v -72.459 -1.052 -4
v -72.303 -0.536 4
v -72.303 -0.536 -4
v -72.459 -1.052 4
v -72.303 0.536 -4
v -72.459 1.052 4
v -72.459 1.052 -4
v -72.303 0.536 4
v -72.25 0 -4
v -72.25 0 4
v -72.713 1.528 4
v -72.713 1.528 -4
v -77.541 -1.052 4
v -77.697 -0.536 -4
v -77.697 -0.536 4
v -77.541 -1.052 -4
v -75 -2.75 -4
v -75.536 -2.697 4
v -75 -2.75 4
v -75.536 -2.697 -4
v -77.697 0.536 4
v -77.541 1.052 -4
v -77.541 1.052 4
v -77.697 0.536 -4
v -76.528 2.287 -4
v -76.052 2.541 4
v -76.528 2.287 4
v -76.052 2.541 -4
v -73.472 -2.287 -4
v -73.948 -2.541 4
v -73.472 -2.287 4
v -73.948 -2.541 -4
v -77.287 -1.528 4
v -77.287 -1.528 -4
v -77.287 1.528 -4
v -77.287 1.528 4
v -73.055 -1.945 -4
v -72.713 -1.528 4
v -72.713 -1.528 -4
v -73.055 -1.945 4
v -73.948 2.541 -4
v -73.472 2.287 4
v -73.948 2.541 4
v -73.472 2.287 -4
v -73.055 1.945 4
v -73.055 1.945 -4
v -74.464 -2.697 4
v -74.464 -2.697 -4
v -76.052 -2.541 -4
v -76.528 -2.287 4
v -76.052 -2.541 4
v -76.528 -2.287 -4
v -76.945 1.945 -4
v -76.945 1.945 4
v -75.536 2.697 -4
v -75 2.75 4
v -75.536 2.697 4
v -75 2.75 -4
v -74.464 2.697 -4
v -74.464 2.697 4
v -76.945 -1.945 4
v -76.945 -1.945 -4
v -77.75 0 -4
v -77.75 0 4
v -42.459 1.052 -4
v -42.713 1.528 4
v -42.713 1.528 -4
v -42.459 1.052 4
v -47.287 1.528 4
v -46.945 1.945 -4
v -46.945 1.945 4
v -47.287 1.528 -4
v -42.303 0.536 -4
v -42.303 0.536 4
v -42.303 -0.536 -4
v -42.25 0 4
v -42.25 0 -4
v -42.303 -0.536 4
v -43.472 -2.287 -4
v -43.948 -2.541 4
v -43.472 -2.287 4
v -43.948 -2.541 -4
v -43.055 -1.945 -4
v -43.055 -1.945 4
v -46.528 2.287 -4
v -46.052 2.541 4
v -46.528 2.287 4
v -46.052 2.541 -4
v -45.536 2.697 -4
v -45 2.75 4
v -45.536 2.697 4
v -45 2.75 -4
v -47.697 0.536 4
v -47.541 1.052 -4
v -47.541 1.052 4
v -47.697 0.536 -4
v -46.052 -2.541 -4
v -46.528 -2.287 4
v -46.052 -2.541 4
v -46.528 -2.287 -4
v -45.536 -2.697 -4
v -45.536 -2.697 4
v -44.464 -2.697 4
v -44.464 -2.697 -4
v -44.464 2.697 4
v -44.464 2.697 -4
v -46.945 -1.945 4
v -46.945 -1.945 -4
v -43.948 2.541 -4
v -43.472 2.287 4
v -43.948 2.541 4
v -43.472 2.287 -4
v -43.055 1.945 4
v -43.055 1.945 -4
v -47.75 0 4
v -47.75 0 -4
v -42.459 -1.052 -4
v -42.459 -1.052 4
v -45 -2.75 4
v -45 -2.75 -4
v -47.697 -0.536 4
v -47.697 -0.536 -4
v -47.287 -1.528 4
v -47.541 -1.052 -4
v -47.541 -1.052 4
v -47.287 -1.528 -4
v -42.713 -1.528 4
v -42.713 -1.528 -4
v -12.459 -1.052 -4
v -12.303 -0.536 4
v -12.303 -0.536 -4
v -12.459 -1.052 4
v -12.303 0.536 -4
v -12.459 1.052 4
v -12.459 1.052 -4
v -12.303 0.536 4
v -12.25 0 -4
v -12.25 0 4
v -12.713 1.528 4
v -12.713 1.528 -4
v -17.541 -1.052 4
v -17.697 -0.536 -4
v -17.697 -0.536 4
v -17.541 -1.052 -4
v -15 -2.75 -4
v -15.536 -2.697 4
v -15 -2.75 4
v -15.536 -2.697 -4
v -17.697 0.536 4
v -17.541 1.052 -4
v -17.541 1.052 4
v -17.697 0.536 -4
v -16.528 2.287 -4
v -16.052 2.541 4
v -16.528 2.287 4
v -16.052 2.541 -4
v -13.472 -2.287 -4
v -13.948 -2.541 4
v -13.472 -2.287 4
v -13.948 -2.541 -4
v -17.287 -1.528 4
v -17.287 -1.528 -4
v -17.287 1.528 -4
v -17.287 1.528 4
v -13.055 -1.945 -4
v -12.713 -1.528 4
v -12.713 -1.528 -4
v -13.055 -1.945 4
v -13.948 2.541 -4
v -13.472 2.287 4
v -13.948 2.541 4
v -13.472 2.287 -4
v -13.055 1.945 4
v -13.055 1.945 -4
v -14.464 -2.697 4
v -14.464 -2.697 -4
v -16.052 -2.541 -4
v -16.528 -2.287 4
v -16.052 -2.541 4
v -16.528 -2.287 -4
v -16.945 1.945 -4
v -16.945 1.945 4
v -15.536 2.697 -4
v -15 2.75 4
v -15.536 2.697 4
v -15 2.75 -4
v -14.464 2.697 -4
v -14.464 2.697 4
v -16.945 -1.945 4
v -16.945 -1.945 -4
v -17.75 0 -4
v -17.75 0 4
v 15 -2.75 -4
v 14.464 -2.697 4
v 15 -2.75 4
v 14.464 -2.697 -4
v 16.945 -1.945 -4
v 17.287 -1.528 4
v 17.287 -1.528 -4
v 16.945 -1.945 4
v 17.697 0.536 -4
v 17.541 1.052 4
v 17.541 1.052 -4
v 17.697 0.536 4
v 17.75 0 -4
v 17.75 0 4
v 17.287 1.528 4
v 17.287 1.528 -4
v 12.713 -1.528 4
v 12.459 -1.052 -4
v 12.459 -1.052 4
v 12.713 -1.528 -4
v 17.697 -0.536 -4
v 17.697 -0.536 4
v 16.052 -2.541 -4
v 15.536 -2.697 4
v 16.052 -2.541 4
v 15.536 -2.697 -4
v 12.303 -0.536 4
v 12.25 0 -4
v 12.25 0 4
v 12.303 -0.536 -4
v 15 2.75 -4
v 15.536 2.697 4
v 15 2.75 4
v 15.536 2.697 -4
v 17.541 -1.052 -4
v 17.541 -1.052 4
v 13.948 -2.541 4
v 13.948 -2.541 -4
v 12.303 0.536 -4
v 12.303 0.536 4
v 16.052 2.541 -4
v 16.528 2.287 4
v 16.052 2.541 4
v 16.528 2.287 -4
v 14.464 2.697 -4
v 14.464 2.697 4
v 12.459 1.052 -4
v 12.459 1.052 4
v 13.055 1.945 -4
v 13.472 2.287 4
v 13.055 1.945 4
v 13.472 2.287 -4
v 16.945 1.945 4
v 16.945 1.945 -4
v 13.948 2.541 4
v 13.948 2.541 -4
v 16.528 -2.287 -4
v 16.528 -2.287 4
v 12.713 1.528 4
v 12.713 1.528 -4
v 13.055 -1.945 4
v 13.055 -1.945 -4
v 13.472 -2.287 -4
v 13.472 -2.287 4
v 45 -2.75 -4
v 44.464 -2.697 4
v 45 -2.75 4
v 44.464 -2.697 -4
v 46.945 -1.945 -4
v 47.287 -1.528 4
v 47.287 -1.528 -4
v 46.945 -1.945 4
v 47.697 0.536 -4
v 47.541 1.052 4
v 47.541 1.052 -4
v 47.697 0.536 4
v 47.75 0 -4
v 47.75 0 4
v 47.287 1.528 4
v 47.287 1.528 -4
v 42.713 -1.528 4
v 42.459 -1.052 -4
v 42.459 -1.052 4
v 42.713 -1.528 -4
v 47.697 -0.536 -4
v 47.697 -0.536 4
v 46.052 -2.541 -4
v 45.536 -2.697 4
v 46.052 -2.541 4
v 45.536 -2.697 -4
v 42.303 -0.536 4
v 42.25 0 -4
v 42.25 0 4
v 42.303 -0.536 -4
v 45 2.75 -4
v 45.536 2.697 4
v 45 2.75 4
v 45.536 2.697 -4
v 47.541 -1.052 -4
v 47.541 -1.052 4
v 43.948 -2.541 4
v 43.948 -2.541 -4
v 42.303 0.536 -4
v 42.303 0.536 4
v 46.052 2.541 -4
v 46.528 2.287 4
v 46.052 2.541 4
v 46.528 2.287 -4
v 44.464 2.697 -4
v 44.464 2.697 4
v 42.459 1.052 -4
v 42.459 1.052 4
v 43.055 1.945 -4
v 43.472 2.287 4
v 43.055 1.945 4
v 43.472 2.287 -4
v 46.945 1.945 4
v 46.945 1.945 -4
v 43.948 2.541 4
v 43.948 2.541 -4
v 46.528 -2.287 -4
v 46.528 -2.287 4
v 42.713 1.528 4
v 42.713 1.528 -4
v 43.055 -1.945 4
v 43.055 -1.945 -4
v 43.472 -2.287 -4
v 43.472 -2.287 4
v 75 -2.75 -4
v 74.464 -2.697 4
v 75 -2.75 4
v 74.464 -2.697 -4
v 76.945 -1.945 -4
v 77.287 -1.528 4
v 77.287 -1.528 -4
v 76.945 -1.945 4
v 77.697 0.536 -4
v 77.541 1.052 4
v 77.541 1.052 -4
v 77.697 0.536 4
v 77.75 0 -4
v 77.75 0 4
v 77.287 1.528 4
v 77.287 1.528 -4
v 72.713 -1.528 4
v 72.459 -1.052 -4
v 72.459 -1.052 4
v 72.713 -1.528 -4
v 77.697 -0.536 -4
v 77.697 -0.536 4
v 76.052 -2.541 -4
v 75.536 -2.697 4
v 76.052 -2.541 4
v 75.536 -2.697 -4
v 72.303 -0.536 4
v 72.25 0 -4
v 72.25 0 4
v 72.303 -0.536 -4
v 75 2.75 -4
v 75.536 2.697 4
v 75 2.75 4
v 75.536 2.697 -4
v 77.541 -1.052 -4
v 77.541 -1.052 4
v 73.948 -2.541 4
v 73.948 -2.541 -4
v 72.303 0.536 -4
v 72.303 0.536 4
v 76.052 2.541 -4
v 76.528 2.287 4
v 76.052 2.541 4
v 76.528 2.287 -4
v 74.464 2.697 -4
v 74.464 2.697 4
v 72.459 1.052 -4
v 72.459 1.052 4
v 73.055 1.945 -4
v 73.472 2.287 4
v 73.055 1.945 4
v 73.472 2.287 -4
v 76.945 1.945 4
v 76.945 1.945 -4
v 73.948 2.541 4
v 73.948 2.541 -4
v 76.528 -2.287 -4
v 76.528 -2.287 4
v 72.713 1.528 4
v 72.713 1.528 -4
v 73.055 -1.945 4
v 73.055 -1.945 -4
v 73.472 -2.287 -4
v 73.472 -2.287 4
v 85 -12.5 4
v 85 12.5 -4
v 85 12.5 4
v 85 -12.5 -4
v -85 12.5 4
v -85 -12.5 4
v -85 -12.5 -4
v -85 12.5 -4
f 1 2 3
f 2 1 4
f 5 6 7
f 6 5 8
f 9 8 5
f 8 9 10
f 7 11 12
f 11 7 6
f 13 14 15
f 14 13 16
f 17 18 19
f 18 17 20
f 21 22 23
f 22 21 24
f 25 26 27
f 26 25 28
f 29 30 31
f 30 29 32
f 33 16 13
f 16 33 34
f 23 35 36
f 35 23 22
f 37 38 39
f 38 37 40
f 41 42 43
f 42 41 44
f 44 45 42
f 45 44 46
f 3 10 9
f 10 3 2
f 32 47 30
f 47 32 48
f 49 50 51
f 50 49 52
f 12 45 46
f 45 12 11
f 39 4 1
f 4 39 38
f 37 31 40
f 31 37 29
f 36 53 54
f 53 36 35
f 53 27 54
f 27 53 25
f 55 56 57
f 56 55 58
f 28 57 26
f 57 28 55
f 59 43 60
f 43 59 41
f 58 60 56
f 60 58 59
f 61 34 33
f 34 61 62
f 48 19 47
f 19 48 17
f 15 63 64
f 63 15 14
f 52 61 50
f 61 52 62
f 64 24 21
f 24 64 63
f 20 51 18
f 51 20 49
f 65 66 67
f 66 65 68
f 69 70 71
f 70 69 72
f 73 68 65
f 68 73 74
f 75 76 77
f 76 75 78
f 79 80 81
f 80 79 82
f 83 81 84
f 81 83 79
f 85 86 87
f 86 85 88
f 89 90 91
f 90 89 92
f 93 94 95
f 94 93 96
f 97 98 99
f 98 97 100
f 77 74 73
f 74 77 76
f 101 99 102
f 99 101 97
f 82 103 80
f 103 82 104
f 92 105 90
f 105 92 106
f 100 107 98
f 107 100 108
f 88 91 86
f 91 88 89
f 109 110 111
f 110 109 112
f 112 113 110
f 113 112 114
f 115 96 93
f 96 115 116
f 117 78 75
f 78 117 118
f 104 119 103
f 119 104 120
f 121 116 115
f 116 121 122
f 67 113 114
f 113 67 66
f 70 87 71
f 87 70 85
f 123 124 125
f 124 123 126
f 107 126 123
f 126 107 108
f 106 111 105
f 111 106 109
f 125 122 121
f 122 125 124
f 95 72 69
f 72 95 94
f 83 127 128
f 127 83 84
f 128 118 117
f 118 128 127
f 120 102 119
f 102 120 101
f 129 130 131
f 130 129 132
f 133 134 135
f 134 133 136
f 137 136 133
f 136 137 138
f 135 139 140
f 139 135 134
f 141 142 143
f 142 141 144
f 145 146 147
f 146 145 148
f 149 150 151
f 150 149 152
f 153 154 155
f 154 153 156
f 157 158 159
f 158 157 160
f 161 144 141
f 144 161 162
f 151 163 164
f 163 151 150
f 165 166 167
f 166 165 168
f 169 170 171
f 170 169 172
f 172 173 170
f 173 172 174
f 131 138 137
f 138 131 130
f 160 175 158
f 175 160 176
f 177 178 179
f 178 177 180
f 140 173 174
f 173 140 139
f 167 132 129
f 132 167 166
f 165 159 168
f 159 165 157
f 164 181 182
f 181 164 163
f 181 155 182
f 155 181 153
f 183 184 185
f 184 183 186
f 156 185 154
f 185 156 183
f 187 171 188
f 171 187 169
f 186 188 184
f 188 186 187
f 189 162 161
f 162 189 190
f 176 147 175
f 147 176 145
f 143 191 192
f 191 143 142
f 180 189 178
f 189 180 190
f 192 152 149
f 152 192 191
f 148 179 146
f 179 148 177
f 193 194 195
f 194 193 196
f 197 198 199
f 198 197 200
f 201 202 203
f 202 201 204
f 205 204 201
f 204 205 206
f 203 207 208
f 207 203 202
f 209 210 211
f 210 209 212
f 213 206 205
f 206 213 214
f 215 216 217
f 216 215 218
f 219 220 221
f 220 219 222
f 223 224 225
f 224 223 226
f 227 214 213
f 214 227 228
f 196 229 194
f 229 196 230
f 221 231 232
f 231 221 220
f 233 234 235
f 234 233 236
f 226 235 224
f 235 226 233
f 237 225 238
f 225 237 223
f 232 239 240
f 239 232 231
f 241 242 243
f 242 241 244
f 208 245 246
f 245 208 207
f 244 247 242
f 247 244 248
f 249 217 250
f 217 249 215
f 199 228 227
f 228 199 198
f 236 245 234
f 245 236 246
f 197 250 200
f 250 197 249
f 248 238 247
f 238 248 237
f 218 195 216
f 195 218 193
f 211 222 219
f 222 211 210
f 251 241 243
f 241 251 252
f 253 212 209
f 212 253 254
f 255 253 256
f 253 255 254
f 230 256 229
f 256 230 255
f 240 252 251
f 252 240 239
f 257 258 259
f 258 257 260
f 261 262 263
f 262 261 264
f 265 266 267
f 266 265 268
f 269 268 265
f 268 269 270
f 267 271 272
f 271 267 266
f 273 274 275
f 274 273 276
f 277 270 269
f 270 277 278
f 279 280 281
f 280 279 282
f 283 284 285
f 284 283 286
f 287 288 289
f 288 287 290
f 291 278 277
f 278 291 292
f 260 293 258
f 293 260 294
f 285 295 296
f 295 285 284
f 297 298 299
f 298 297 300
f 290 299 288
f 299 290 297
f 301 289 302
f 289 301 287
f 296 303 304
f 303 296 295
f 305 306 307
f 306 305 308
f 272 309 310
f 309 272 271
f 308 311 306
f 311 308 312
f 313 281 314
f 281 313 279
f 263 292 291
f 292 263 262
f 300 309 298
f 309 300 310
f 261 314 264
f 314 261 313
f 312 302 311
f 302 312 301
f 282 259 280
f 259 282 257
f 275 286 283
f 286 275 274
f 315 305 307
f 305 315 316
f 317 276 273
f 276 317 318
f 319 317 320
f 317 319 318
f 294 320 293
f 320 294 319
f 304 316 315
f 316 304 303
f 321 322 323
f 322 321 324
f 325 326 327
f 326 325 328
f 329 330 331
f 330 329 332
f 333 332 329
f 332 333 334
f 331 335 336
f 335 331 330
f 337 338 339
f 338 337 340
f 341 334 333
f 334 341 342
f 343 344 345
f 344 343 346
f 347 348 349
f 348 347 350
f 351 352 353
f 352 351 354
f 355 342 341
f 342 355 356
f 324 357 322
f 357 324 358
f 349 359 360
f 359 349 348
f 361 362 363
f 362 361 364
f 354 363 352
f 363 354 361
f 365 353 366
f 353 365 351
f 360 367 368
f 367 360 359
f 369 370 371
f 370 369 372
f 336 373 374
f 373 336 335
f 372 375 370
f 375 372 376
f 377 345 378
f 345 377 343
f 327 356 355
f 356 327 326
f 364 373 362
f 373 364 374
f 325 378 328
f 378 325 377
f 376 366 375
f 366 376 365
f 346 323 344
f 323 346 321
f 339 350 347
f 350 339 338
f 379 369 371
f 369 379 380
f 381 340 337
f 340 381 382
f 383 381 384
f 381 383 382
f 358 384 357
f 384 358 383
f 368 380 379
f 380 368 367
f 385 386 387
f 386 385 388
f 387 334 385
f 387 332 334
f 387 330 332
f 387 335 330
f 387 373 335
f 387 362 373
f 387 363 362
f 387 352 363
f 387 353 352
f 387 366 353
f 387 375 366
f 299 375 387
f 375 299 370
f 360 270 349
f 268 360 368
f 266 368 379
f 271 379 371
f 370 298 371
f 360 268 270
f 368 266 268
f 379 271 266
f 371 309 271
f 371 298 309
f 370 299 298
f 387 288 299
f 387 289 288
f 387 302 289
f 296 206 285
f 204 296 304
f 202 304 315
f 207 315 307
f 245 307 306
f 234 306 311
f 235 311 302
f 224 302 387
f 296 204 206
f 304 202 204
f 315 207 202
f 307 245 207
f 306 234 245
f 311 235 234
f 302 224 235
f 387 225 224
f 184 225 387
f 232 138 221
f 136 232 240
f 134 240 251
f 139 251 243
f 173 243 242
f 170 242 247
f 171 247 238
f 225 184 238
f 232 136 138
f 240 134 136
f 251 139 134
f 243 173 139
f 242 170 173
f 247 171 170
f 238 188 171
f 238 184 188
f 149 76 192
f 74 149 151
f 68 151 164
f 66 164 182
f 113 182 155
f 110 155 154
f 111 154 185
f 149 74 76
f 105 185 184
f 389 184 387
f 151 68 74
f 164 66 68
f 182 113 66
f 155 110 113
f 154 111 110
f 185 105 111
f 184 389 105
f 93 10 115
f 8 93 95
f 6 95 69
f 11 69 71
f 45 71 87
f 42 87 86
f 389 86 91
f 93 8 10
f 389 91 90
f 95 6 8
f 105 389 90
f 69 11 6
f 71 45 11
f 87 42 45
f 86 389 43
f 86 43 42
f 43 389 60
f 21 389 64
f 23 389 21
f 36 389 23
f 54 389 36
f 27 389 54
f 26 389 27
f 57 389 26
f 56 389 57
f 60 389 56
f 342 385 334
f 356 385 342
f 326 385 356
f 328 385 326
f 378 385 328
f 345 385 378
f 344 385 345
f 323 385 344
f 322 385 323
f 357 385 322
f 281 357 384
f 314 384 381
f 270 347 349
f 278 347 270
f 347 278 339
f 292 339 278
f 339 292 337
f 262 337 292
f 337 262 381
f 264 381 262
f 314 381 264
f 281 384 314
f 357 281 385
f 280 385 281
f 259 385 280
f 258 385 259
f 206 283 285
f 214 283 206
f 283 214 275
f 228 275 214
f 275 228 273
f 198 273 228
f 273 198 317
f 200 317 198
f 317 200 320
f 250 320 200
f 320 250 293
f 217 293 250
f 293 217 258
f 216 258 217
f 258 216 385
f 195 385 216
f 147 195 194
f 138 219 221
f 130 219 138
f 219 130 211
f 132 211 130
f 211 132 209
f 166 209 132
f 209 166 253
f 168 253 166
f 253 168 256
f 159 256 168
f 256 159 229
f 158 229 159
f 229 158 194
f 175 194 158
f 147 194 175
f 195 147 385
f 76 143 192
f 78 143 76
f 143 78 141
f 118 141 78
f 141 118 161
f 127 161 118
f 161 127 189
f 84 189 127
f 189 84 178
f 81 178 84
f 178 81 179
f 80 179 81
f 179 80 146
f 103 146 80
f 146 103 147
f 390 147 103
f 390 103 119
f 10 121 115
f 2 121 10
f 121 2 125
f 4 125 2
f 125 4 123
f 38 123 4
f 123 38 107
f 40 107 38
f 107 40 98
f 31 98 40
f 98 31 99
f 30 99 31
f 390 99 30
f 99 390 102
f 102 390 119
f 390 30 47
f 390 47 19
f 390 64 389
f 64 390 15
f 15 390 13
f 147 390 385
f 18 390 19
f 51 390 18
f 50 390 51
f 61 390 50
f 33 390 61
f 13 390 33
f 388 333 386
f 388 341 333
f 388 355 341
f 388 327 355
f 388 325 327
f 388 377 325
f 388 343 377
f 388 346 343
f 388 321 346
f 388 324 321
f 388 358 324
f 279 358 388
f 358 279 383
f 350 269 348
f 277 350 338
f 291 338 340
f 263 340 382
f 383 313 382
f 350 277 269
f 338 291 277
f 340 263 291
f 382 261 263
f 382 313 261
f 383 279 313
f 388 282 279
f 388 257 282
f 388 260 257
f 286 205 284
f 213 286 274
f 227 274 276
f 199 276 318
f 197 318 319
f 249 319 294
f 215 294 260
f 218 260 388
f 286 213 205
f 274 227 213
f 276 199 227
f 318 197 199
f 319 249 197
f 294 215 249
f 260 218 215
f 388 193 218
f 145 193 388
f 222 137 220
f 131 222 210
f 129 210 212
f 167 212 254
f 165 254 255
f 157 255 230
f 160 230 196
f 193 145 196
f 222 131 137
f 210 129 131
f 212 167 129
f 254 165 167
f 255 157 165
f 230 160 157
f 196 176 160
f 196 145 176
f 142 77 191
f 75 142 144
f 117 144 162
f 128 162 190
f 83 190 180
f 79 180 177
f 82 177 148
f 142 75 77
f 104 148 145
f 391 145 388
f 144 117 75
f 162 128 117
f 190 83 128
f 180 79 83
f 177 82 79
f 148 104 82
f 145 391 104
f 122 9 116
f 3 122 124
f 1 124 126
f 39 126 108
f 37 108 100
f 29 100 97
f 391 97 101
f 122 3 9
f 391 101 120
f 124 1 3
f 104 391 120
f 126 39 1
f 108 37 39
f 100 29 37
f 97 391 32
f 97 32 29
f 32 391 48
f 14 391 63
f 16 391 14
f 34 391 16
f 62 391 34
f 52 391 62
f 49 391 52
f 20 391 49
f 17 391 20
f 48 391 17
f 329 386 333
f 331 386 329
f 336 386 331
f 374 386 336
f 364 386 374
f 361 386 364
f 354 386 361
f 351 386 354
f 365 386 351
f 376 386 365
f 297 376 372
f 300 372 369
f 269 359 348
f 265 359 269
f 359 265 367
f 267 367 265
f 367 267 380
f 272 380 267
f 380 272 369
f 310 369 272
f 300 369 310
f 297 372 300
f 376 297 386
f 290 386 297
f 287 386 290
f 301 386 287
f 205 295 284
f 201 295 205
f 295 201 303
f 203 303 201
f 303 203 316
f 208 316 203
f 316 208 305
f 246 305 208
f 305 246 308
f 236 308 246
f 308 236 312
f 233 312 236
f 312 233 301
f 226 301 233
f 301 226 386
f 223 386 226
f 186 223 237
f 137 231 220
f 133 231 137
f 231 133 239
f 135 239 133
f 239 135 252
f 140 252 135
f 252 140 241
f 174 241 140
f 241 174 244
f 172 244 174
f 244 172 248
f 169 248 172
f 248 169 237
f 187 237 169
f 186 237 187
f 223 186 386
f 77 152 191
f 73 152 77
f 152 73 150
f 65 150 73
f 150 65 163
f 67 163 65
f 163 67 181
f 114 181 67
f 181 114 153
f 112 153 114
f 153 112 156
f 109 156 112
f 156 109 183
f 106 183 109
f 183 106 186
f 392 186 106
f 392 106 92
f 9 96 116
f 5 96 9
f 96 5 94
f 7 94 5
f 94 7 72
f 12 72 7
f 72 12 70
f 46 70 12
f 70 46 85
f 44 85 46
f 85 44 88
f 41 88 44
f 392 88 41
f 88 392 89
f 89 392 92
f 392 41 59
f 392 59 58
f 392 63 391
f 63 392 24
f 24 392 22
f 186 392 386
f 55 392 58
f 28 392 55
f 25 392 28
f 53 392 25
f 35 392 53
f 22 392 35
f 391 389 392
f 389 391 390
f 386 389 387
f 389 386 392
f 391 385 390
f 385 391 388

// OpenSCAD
$fn = 32;

// ----------------------------------------------------------------------
// Hole bar, 6 x Ø5.5
// row layout, 10 mm edge offset
// ----------------------------------------------------------------------

// --- parameters (mm) ---
bar_w = 25;    // bar width (Y)
bar_t = 8;     // bar thickness (Z)
holes = 6;     // holes per row
hole_d = 5.5;  // hole diameter
edge = 10;     // offset from the bar end to the first hole
pitch = 30;    // pitch between neighbouring holes

// --- derived feature positions (mm) ---
span = (holes - 1) * pitch;   // = 150   distance between the end holes
bar_l = span + 2 * edge;      // = 170   overall bar length
start_x = -bar_l / 2 + edge;  // = -75   X of the first hole
feature_centers = [
  [start_x + 0 * pitch, 0],
  [start_x + 1 * pitch, 0],
  [start_x + 2 * pitch, 0],
  [start_x + 3 * pitch, 0],
  [start_x + 4 * pitch, 0],
  [start_x + 5 * pitch, 0]
];   // hole centres of the first row

// bar with one row of holes, drilled from feature_centers
difference() {
  translate([-bar_l / 2, -bar_w / 2, -bar_t / 2]) cube([bar_l, bar_w, bar_t]);
  for (centre = feature_centers)
    translate([centre[0], centre[1], 0])
      cylinder(d = hole_d, h = bar_t + 2, center = true);
}
